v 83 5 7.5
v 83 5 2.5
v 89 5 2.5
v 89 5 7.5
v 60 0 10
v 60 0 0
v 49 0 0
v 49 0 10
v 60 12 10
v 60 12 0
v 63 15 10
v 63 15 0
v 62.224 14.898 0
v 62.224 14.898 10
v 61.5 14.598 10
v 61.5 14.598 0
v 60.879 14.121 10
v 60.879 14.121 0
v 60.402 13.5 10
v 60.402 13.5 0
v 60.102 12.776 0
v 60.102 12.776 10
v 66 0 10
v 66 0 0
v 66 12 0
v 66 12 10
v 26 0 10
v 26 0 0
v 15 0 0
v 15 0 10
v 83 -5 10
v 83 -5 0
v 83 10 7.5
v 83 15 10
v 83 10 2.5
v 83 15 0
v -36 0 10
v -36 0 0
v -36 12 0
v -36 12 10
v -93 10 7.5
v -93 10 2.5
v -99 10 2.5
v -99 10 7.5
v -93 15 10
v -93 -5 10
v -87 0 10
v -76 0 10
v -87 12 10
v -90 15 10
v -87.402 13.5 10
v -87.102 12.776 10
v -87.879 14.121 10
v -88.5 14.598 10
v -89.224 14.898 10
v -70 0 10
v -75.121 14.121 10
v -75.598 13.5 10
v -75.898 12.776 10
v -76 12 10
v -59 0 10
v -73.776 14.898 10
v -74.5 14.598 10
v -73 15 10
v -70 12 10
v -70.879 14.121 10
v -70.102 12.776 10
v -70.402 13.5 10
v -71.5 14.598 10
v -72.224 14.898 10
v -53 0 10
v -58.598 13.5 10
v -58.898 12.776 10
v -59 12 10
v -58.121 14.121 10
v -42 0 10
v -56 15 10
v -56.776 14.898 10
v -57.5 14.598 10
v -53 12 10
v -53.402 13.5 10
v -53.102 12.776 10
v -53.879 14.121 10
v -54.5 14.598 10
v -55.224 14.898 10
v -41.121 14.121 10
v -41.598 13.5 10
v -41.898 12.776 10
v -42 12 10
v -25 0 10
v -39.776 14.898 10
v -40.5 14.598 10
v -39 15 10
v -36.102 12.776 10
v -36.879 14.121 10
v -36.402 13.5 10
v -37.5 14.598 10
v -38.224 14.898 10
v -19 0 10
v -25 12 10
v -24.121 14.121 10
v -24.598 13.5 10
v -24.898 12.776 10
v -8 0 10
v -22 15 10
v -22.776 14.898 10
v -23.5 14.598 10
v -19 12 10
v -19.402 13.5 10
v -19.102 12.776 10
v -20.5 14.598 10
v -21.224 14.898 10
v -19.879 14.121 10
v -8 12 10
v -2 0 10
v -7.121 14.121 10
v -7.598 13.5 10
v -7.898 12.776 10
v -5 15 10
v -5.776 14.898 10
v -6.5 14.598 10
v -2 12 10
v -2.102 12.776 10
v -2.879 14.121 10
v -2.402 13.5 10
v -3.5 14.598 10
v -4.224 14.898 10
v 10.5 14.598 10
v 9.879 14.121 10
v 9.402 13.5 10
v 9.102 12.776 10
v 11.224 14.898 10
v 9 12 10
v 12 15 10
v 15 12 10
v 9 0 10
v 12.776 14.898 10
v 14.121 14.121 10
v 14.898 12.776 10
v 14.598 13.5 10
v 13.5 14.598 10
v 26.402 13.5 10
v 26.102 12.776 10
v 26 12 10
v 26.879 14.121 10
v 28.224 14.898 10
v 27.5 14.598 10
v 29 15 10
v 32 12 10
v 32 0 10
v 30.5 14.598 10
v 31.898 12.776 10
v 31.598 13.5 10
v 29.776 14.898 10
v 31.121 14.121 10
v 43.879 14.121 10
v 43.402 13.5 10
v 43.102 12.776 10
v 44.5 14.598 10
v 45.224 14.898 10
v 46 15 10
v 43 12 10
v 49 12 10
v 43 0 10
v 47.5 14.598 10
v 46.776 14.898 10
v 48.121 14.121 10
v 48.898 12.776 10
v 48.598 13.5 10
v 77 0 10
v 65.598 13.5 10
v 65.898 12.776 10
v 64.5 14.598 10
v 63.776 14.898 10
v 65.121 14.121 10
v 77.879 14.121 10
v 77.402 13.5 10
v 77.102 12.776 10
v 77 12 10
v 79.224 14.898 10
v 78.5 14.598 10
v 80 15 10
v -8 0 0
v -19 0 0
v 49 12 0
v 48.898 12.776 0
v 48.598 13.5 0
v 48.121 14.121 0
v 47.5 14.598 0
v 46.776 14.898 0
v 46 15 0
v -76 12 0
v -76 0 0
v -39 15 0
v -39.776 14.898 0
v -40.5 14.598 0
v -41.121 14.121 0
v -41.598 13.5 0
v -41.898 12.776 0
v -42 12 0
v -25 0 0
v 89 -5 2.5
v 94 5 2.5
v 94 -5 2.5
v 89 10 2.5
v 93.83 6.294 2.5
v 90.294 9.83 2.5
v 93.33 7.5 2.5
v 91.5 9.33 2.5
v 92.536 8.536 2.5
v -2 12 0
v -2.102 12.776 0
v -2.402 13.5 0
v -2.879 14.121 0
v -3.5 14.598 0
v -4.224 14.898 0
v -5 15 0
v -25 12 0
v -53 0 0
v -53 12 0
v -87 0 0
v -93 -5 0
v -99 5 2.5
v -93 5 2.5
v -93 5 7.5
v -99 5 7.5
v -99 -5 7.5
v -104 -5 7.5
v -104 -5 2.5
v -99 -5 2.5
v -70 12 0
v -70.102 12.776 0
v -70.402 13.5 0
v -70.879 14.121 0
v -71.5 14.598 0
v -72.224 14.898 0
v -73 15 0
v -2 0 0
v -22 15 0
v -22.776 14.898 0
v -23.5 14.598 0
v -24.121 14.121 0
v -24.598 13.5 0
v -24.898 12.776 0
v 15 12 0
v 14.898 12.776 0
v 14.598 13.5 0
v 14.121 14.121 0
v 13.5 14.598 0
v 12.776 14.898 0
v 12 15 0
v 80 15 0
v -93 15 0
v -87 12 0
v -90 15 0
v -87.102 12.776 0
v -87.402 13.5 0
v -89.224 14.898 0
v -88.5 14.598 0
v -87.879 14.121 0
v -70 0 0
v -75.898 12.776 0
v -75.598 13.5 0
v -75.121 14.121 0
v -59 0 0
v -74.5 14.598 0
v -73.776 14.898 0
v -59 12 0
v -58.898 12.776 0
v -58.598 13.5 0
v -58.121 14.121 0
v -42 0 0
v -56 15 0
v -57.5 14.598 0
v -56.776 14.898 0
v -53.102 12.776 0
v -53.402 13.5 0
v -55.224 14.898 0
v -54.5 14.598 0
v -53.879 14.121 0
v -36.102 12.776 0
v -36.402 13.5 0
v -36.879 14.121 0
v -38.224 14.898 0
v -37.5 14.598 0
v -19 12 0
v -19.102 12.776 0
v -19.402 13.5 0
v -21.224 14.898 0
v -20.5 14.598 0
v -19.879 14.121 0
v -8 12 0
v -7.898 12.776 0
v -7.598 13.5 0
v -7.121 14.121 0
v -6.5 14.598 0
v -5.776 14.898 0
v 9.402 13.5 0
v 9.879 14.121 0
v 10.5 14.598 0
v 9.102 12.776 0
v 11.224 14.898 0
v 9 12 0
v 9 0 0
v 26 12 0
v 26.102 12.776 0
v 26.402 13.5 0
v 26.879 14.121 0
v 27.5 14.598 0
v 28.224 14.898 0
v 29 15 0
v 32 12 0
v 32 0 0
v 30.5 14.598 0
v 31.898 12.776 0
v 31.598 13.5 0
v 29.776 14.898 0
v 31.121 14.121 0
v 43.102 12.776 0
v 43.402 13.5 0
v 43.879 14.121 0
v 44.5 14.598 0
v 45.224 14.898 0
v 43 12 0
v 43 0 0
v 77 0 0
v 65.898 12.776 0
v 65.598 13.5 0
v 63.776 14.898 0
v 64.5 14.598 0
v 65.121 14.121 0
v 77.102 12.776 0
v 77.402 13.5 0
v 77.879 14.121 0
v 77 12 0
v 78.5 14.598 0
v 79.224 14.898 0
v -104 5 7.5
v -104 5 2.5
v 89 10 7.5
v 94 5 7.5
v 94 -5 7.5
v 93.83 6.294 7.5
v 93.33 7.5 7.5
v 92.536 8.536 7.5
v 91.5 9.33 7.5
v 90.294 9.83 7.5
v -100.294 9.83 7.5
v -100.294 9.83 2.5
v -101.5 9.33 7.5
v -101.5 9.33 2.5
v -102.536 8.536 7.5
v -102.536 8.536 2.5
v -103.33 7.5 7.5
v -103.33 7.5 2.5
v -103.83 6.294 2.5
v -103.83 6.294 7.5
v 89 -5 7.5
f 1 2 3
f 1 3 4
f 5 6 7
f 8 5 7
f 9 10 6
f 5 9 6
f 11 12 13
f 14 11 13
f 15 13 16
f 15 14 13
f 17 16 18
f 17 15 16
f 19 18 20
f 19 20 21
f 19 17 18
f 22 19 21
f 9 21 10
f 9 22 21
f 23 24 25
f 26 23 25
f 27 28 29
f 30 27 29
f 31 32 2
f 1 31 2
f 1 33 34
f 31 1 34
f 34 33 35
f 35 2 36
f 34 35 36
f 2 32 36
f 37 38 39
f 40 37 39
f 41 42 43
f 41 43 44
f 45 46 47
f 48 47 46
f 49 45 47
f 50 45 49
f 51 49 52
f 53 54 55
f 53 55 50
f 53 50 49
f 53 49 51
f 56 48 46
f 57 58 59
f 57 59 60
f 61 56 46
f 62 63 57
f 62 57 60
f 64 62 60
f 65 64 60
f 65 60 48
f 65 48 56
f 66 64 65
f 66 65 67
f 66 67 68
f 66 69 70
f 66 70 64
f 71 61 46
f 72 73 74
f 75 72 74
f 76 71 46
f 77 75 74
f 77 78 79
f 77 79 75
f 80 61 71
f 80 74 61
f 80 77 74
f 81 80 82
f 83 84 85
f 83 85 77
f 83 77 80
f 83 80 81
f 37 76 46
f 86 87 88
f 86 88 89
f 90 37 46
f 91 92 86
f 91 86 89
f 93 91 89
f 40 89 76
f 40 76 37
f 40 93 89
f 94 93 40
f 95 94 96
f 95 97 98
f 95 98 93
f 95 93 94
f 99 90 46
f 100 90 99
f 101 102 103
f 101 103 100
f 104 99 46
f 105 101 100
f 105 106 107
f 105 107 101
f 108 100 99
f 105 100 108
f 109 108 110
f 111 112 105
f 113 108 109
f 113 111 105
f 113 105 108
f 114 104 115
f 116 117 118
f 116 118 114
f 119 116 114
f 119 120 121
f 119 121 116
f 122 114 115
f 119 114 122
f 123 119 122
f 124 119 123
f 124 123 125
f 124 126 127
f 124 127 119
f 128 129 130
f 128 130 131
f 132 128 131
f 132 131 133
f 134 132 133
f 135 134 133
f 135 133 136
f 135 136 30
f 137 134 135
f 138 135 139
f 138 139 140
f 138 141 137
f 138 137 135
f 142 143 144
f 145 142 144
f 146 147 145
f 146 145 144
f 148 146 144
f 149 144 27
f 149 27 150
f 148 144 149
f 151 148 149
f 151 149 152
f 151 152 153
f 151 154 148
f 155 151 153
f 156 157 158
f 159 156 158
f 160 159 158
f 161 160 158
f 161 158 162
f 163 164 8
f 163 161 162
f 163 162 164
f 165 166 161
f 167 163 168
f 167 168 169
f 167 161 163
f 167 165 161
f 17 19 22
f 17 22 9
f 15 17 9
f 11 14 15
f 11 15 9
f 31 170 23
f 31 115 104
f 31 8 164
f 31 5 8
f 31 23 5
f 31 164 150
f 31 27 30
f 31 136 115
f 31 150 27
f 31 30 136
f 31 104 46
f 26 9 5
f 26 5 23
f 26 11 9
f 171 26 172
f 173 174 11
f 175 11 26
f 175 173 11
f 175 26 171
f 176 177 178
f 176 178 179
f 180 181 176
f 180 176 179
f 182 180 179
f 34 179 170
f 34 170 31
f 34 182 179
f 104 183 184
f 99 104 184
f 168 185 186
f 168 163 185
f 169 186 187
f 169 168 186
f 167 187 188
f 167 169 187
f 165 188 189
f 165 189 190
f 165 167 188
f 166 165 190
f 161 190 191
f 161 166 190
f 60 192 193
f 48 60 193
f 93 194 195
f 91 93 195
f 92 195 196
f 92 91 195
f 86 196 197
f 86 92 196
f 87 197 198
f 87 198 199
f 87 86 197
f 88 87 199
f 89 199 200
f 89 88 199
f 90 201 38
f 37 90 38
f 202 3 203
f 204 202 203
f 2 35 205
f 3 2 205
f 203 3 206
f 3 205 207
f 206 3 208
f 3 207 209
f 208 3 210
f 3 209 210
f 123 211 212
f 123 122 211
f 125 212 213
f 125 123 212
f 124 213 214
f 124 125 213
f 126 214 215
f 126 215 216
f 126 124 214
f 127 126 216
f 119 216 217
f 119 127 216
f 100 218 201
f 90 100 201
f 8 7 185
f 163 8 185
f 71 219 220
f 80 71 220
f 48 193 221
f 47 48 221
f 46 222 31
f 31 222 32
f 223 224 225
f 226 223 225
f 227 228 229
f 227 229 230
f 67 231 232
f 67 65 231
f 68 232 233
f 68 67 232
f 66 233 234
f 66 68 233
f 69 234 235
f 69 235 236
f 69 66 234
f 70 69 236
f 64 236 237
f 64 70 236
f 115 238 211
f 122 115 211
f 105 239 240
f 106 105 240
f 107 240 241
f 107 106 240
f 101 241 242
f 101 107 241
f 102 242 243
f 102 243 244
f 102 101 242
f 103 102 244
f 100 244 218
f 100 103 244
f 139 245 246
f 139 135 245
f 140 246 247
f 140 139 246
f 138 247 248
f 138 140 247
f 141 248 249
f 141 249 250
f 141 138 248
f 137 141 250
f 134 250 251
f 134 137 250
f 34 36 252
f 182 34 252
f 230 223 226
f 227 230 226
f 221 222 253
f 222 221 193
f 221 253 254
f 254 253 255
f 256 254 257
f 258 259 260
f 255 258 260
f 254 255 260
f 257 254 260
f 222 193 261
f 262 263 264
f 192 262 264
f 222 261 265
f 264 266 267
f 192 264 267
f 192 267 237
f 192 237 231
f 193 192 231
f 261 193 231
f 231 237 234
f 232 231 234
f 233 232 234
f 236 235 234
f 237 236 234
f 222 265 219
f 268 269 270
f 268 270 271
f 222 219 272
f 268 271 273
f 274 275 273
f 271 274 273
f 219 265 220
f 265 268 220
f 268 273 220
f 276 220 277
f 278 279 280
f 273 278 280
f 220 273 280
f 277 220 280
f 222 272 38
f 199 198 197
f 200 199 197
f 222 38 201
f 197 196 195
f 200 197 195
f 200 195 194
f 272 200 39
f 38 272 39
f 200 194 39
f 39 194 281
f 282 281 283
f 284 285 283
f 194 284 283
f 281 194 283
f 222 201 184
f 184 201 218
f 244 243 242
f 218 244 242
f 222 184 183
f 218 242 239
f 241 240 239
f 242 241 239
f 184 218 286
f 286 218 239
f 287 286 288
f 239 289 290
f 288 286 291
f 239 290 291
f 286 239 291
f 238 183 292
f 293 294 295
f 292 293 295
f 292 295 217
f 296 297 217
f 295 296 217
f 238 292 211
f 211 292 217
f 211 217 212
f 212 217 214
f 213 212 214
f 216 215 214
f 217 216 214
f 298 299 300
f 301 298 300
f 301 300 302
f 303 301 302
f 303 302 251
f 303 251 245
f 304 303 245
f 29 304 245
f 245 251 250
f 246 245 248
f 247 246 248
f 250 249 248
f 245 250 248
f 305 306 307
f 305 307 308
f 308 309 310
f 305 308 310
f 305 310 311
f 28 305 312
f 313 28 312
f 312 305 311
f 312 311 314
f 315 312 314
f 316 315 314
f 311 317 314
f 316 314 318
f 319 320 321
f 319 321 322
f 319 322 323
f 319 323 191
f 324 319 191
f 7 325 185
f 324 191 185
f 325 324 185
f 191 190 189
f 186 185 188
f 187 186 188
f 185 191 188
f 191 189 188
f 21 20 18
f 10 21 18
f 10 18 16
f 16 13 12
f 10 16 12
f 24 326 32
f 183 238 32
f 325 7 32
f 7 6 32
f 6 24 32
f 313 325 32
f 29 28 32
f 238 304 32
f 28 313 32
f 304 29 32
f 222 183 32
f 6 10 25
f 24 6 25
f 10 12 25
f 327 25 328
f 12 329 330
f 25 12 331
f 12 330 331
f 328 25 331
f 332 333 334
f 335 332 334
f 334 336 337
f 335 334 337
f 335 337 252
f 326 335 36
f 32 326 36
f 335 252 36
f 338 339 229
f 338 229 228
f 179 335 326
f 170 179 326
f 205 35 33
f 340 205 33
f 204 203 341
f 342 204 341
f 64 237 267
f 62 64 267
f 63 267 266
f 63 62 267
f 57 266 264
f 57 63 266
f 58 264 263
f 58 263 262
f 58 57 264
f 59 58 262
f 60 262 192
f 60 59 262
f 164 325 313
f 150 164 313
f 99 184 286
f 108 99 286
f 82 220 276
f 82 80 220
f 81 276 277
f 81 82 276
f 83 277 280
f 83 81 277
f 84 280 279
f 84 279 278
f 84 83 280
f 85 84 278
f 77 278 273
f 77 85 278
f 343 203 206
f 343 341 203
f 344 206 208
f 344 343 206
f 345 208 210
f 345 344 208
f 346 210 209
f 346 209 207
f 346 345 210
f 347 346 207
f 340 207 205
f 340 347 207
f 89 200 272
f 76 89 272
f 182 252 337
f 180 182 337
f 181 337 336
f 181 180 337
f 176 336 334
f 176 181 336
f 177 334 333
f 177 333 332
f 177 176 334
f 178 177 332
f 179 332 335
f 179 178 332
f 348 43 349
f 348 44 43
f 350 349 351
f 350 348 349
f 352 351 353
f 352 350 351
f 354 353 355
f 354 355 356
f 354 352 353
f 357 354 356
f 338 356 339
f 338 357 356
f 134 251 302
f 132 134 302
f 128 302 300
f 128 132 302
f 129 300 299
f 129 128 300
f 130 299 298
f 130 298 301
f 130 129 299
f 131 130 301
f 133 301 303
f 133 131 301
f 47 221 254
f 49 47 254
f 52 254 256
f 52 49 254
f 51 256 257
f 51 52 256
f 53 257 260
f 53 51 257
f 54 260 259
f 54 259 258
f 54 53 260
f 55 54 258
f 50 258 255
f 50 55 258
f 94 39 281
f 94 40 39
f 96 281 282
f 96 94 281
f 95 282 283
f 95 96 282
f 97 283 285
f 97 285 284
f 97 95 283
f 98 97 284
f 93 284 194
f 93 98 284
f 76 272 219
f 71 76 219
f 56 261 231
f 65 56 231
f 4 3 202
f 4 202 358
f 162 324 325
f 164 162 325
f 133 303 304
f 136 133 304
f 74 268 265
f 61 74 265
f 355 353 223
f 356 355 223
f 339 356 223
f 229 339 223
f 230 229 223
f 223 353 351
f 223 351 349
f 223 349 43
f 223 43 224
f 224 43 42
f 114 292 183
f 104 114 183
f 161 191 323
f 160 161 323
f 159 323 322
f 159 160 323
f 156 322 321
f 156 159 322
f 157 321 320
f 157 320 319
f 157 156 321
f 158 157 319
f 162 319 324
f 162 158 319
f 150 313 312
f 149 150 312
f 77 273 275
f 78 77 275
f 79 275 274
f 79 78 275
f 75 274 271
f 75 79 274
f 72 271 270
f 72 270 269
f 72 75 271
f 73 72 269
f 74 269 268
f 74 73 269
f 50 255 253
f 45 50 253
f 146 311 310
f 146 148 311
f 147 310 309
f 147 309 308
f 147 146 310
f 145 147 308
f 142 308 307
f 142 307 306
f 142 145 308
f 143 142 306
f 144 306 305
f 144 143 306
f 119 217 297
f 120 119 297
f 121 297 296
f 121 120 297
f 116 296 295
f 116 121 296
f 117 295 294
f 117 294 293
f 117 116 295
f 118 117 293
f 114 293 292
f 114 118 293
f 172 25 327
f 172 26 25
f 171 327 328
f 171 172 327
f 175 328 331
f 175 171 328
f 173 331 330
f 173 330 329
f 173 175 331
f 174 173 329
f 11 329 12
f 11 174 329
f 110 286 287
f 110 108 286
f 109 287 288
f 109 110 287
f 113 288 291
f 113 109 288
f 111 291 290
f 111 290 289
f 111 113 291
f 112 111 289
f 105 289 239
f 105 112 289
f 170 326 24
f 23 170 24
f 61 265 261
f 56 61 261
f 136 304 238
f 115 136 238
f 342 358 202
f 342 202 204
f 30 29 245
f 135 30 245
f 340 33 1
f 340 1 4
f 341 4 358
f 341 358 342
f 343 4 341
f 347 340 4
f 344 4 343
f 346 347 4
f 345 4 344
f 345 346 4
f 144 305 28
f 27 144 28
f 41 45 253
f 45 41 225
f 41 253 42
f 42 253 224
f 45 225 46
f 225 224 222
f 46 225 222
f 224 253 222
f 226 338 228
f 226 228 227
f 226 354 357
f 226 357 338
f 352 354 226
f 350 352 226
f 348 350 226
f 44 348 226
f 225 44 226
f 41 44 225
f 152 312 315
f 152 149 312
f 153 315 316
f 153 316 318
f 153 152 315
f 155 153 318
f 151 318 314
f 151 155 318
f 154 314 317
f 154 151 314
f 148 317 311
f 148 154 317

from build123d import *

# Parameters (mm, degrees)
F1_DEPTH  = 10
F2_W      = 5
F2_H      = 5
F3_DEPTH  = 11
F4_W      = 5
F4_H      = 5
F5_DEPTH  = 10
F6_R      = 2.99999
F7_R      = 5
F8_W      = 5
F8_H      = 5
F9_DEPTH  = 11
F10_W     = 5
F10_H     = 5
F11_DEPTH = 10
F12_R     = 5


# Not quite as in the source:
# - a fillet or chamfer is up to 0.001 mm smaller than in the source, because OpenCascade refuses the exact size


with BuildPart() as f1:
    # F0 (on Top) → F1 (new body)
    with BuildSketch(Plane.XY):
        Polygon((83, -5), (83, 15), (77, 15), (77, 0), (66, 0), (66, 15), (60, 15), (60, 0), (49, 0), (49, 15), (43, 15), (43, 0), (32, 0), (32, 15), (26, 15), (26, 0), (15, 0), (15, 15), (9, 15), (9, 0), (-2, 0), (-2, 15), (-8, 15), (-8, 0), (-19, 0), (-19, 15), (-25, 15), (-25, 0), (-36, 0), (-36, 15), (-42, 15), (-42, 0), (-53, 0), (-53, 15), (-59, 15), (-59, 0), (-70, 0), (-70, 15), (-76, 15), (-76, 0), (-87, 0), (-87, 15), (-93, 15), (-93, -5), align=None)
    extrude(amount=F1_DEPTH)

    # F2 (on face) → F3 (join)
    with BuildSketch(Plane(origin=(-93, 0, 0), x_dir=(0, -1, 0), z_dir=(-1, 0, 0))):
        with Locations((-7.5, 5)):
            Rectangle(F2_W, F2_H)
    extrude(amount=F3_DEPTH)

    # F4 (on face) → F5 (join)
    with BuildSketch(Plane.XZ.offset(-5)):
        with Locations((-101.5, 5)):
            Rectangle(F4_W, F4_H)
    extrude(amount=F5_DEPTH)

    # F6 (radius 3 in the source; OpenCascade refuses exactly that, so slightly less here)
    f6_edges = [f1.edges().sort_by_distance(p)[0] for p in [
        (-87, 15, 5),
        (-76, 15, 5),
        (-70, 15, 5),
        (-59, 15, 5),
        (-53, 15, 5),
        (-42, 15, 5),
        (-36, 15, 5),
        (-25, 15, 5),
        (-19, 15, 5),
        (-8, 15, 5),
        (-2, 15, 5),
        (9, 15, 5),
        (15, 15, 5),
        (26, 15, 5),
        (32, 15, 5),
        (43, 15, 5),
        (49, 15, 5),
        (60, 15, 5),
        (66, 15, 5),
        (77, 15, 5),
    ]]
    fillet(f6_edges, radius=F6_R)

    # F7
    f7_edges = [f1.edges().sort_by_distance(p)[0] for p in [
        (-104, 10, 5),
    ]]
    fillet(f7_edges, radius=F7_R)

    # F8 (on face) → F9 (join)
    with BuildSketch(Plane.YZ.offset(83)):
        with Locations((7.5, 5)):
            Rectangle(F8_W, F8_H)
    extrude(amount=F9_DEPTH)

    # F10 (on face) → F11 (join)
    with BuildSketch(Plane.XZ.offset(-5)):
        with Locations((91.5, 5)):
            Rectangle(F10_W, F10_H)
    extrude(amount=F11_DEPTH)

    # F12
    f12_edges = [f1.edges().sort_by_distance(p)[0] for p in [
        (94, 10, 5),
    ]]
    fillet(f12_edges, radius=F12_R)


solid = f1.part
